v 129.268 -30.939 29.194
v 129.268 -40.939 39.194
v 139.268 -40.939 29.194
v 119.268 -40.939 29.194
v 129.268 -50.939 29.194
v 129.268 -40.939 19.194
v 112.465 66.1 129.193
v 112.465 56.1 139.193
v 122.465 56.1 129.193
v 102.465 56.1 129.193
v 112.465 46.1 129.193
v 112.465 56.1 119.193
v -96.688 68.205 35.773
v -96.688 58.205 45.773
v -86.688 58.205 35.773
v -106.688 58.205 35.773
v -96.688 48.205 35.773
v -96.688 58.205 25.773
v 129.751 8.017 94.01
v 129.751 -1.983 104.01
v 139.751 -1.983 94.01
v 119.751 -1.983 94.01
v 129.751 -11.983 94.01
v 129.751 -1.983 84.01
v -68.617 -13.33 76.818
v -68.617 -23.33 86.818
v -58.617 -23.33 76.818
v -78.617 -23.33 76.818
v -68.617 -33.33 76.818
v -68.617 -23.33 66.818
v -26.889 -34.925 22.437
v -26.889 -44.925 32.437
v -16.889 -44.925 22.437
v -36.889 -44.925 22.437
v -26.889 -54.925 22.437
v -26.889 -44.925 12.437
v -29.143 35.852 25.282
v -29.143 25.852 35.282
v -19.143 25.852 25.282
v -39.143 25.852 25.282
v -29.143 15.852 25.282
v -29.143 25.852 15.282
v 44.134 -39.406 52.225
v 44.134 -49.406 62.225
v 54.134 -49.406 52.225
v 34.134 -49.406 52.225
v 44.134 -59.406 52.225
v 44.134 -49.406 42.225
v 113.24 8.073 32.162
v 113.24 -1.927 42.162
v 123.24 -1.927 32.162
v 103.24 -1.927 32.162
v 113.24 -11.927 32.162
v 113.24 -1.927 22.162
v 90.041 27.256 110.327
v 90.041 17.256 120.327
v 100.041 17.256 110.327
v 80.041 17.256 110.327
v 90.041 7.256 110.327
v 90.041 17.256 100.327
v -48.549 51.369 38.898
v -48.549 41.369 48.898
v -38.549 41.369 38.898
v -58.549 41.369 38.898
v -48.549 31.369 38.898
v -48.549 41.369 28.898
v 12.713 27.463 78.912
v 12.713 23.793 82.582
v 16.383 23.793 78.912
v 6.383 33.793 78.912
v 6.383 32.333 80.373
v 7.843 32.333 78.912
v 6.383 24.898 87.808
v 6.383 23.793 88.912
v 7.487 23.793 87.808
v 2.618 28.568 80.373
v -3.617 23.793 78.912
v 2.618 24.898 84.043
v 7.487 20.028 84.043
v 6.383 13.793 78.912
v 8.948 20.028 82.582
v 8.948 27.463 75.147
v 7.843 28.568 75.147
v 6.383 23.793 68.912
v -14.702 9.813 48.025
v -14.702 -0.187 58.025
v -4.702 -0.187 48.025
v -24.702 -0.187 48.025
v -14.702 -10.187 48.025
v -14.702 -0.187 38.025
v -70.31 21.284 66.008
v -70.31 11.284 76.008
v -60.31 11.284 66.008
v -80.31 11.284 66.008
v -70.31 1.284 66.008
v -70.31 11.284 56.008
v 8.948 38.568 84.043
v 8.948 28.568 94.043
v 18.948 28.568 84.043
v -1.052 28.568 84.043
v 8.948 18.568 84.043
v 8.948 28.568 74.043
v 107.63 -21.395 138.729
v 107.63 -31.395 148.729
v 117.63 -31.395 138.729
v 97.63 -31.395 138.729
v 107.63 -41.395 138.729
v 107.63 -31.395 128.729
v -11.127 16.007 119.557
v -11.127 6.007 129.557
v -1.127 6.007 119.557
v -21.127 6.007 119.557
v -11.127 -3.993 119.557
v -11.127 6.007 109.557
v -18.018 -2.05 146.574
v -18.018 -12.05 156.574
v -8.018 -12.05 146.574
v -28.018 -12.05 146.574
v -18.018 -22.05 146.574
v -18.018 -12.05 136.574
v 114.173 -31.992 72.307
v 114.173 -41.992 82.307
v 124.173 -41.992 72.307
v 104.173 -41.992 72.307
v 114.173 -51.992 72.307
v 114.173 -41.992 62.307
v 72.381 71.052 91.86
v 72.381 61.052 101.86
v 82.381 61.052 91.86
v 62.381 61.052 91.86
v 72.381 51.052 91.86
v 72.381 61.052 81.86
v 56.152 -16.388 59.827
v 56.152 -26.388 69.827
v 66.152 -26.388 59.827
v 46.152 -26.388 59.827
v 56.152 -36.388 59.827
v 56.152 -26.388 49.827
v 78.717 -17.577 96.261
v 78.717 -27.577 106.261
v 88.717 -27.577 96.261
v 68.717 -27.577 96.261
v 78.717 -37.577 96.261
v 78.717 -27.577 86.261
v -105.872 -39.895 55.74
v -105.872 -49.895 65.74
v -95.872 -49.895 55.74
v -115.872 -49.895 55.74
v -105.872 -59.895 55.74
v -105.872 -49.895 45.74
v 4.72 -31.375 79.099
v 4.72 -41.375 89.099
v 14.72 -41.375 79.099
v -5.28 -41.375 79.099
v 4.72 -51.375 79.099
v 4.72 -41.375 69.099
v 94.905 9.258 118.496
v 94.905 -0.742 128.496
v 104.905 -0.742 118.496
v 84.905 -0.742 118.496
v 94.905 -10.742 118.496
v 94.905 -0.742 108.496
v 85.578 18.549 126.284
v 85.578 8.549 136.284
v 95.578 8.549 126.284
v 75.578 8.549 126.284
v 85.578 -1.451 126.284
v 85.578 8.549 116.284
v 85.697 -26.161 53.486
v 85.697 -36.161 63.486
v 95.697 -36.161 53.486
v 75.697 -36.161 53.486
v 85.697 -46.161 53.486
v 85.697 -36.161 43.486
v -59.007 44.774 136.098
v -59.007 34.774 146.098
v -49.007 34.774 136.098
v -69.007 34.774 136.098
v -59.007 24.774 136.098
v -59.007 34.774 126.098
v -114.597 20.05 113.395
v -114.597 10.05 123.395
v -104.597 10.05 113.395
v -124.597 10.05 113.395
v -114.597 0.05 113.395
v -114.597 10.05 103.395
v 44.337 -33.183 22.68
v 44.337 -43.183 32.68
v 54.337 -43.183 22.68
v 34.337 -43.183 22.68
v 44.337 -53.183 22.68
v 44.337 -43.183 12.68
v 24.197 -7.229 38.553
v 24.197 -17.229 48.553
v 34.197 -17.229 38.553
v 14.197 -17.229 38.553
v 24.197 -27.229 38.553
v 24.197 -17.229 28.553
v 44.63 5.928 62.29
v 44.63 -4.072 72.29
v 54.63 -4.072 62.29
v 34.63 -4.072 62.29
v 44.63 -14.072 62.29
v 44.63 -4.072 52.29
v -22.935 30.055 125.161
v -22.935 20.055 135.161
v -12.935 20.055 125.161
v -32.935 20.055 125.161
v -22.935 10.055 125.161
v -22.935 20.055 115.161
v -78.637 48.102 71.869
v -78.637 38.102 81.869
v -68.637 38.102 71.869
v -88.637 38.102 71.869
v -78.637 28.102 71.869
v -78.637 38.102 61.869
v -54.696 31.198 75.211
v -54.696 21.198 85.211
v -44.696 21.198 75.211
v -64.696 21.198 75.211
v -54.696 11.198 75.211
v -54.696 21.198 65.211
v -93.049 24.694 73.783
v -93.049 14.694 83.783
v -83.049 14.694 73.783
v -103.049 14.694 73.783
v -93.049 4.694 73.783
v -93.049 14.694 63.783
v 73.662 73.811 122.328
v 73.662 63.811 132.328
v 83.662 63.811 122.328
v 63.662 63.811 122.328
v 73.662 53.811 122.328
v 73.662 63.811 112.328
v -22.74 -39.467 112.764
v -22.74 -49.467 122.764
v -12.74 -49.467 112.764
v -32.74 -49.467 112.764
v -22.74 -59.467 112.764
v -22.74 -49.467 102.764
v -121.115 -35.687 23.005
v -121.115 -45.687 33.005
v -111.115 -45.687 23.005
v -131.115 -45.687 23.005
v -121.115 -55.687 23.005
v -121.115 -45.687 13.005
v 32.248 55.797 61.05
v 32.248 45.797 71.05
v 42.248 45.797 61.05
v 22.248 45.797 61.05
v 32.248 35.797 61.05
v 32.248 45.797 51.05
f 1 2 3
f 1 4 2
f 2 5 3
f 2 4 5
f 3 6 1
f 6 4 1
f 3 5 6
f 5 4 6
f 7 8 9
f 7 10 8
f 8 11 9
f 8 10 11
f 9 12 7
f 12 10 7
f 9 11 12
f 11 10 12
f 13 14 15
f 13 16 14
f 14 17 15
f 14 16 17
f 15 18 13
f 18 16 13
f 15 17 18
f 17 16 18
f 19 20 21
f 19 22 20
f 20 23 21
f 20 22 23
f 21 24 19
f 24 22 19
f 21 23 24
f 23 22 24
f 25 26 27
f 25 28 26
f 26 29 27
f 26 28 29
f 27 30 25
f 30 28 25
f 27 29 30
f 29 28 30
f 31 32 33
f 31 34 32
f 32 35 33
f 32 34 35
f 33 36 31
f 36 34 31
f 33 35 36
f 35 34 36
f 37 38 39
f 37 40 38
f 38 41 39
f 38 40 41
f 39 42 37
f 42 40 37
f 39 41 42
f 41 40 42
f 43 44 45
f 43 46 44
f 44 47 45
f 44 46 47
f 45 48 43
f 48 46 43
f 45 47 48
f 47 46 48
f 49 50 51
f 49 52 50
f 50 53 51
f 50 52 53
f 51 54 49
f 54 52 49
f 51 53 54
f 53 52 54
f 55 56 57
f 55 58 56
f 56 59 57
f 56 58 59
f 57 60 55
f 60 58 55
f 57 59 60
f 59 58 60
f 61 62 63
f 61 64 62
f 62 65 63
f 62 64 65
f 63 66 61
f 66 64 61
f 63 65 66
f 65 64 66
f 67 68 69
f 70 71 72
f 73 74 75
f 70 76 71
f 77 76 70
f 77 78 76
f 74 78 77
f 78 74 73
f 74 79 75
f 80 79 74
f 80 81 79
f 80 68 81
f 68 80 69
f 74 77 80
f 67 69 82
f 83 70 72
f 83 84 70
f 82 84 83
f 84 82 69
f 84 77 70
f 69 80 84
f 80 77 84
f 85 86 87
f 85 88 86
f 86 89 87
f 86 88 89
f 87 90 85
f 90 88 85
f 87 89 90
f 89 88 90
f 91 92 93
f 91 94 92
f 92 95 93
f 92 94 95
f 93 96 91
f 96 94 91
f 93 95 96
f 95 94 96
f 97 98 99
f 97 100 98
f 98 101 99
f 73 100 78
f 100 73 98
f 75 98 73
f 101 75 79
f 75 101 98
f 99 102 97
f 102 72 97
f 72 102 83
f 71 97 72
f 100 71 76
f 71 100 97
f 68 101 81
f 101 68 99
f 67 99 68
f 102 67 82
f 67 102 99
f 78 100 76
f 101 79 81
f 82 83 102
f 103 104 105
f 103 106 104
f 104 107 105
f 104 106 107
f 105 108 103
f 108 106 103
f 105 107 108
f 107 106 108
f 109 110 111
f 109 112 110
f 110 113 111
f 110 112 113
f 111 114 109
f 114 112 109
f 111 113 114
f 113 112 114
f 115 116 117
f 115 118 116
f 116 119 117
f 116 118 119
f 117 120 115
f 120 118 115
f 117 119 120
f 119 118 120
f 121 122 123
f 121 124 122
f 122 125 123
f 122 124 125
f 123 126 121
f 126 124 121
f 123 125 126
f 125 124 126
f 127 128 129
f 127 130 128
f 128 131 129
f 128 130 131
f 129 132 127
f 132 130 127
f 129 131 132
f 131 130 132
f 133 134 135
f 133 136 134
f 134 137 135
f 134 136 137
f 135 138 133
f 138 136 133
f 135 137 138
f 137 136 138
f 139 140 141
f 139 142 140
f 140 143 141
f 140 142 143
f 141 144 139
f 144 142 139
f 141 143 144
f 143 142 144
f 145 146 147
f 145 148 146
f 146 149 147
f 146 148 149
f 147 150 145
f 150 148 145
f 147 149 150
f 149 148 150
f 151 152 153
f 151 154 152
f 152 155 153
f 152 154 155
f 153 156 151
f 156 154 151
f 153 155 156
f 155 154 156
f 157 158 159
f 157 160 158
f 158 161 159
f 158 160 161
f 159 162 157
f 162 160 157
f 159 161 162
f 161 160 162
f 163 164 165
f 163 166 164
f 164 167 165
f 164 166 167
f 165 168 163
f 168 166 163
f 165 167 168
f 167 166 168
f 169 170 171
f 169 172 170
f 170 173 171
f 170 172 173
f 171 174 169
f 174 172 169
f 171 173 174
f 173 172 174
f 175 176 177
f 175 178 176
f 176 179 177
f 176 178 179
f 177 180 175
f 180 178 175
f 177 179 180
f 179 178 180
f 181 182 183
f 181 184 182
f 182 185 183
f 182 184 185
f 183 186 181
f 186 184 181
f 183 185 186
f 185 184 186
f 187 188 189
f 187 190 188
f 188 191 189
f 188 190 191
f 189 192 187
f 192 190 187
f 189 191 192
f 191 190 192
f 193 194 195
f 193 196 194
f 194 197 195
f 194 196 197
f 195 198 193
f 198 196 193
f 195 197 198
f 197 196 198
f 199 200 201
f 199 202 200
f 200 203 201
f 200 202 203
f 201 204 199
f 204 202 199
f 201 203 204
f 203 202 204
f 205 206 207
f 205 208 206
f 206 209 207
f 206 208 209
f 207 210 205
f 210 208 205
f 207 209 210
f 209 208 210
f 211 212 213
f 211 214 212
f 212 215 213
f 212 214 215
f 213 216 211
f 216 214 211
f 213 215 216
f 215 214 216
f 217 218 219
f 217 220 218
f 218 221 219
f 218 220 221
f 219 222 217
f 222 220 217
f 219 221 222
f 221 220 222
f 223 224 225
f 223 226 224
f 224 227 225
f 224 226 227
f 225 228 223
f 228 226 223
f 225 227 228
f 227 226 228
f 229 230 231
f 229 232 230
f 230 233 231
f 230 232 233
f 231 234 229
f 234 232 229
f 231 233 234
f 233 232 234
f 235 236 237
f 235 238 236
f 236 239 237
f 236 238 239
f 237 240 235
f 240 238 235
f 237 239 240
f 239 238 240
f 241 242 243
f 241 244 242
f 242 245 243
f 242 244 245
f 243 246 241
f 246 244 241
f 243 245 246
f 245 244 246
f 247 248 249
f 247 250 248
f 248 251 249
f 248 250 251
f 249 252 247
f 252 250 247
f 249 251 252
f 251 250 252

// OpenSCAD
seed = 1;
x_range = 260;
y_range = 130;
z_range = 130;

n_pieces = 40;
rand_x = rands(0, x_range, n_pieces, seed);
rand_y = rands(0, y_range, n_pieces, seed + 1);
rand_z = rands(0, z_range, n_pieces, seed + 2);

translate([-130, -65, 0]) {
translate([0, 0, 10])
for(i = [0: n_pieces - 1]) {
    translate([rand_x[i], rand_y[i], rand_z[i]])
    diamond();
}
}

module diamond() {
    translate([0, 0, 10])
    cylinder(r1 = 10, r2 = 0, h = 10, $fn = 4);
    cylinder(r1 = 0, r2 = 10, h = 10, $fn = 4);
}
